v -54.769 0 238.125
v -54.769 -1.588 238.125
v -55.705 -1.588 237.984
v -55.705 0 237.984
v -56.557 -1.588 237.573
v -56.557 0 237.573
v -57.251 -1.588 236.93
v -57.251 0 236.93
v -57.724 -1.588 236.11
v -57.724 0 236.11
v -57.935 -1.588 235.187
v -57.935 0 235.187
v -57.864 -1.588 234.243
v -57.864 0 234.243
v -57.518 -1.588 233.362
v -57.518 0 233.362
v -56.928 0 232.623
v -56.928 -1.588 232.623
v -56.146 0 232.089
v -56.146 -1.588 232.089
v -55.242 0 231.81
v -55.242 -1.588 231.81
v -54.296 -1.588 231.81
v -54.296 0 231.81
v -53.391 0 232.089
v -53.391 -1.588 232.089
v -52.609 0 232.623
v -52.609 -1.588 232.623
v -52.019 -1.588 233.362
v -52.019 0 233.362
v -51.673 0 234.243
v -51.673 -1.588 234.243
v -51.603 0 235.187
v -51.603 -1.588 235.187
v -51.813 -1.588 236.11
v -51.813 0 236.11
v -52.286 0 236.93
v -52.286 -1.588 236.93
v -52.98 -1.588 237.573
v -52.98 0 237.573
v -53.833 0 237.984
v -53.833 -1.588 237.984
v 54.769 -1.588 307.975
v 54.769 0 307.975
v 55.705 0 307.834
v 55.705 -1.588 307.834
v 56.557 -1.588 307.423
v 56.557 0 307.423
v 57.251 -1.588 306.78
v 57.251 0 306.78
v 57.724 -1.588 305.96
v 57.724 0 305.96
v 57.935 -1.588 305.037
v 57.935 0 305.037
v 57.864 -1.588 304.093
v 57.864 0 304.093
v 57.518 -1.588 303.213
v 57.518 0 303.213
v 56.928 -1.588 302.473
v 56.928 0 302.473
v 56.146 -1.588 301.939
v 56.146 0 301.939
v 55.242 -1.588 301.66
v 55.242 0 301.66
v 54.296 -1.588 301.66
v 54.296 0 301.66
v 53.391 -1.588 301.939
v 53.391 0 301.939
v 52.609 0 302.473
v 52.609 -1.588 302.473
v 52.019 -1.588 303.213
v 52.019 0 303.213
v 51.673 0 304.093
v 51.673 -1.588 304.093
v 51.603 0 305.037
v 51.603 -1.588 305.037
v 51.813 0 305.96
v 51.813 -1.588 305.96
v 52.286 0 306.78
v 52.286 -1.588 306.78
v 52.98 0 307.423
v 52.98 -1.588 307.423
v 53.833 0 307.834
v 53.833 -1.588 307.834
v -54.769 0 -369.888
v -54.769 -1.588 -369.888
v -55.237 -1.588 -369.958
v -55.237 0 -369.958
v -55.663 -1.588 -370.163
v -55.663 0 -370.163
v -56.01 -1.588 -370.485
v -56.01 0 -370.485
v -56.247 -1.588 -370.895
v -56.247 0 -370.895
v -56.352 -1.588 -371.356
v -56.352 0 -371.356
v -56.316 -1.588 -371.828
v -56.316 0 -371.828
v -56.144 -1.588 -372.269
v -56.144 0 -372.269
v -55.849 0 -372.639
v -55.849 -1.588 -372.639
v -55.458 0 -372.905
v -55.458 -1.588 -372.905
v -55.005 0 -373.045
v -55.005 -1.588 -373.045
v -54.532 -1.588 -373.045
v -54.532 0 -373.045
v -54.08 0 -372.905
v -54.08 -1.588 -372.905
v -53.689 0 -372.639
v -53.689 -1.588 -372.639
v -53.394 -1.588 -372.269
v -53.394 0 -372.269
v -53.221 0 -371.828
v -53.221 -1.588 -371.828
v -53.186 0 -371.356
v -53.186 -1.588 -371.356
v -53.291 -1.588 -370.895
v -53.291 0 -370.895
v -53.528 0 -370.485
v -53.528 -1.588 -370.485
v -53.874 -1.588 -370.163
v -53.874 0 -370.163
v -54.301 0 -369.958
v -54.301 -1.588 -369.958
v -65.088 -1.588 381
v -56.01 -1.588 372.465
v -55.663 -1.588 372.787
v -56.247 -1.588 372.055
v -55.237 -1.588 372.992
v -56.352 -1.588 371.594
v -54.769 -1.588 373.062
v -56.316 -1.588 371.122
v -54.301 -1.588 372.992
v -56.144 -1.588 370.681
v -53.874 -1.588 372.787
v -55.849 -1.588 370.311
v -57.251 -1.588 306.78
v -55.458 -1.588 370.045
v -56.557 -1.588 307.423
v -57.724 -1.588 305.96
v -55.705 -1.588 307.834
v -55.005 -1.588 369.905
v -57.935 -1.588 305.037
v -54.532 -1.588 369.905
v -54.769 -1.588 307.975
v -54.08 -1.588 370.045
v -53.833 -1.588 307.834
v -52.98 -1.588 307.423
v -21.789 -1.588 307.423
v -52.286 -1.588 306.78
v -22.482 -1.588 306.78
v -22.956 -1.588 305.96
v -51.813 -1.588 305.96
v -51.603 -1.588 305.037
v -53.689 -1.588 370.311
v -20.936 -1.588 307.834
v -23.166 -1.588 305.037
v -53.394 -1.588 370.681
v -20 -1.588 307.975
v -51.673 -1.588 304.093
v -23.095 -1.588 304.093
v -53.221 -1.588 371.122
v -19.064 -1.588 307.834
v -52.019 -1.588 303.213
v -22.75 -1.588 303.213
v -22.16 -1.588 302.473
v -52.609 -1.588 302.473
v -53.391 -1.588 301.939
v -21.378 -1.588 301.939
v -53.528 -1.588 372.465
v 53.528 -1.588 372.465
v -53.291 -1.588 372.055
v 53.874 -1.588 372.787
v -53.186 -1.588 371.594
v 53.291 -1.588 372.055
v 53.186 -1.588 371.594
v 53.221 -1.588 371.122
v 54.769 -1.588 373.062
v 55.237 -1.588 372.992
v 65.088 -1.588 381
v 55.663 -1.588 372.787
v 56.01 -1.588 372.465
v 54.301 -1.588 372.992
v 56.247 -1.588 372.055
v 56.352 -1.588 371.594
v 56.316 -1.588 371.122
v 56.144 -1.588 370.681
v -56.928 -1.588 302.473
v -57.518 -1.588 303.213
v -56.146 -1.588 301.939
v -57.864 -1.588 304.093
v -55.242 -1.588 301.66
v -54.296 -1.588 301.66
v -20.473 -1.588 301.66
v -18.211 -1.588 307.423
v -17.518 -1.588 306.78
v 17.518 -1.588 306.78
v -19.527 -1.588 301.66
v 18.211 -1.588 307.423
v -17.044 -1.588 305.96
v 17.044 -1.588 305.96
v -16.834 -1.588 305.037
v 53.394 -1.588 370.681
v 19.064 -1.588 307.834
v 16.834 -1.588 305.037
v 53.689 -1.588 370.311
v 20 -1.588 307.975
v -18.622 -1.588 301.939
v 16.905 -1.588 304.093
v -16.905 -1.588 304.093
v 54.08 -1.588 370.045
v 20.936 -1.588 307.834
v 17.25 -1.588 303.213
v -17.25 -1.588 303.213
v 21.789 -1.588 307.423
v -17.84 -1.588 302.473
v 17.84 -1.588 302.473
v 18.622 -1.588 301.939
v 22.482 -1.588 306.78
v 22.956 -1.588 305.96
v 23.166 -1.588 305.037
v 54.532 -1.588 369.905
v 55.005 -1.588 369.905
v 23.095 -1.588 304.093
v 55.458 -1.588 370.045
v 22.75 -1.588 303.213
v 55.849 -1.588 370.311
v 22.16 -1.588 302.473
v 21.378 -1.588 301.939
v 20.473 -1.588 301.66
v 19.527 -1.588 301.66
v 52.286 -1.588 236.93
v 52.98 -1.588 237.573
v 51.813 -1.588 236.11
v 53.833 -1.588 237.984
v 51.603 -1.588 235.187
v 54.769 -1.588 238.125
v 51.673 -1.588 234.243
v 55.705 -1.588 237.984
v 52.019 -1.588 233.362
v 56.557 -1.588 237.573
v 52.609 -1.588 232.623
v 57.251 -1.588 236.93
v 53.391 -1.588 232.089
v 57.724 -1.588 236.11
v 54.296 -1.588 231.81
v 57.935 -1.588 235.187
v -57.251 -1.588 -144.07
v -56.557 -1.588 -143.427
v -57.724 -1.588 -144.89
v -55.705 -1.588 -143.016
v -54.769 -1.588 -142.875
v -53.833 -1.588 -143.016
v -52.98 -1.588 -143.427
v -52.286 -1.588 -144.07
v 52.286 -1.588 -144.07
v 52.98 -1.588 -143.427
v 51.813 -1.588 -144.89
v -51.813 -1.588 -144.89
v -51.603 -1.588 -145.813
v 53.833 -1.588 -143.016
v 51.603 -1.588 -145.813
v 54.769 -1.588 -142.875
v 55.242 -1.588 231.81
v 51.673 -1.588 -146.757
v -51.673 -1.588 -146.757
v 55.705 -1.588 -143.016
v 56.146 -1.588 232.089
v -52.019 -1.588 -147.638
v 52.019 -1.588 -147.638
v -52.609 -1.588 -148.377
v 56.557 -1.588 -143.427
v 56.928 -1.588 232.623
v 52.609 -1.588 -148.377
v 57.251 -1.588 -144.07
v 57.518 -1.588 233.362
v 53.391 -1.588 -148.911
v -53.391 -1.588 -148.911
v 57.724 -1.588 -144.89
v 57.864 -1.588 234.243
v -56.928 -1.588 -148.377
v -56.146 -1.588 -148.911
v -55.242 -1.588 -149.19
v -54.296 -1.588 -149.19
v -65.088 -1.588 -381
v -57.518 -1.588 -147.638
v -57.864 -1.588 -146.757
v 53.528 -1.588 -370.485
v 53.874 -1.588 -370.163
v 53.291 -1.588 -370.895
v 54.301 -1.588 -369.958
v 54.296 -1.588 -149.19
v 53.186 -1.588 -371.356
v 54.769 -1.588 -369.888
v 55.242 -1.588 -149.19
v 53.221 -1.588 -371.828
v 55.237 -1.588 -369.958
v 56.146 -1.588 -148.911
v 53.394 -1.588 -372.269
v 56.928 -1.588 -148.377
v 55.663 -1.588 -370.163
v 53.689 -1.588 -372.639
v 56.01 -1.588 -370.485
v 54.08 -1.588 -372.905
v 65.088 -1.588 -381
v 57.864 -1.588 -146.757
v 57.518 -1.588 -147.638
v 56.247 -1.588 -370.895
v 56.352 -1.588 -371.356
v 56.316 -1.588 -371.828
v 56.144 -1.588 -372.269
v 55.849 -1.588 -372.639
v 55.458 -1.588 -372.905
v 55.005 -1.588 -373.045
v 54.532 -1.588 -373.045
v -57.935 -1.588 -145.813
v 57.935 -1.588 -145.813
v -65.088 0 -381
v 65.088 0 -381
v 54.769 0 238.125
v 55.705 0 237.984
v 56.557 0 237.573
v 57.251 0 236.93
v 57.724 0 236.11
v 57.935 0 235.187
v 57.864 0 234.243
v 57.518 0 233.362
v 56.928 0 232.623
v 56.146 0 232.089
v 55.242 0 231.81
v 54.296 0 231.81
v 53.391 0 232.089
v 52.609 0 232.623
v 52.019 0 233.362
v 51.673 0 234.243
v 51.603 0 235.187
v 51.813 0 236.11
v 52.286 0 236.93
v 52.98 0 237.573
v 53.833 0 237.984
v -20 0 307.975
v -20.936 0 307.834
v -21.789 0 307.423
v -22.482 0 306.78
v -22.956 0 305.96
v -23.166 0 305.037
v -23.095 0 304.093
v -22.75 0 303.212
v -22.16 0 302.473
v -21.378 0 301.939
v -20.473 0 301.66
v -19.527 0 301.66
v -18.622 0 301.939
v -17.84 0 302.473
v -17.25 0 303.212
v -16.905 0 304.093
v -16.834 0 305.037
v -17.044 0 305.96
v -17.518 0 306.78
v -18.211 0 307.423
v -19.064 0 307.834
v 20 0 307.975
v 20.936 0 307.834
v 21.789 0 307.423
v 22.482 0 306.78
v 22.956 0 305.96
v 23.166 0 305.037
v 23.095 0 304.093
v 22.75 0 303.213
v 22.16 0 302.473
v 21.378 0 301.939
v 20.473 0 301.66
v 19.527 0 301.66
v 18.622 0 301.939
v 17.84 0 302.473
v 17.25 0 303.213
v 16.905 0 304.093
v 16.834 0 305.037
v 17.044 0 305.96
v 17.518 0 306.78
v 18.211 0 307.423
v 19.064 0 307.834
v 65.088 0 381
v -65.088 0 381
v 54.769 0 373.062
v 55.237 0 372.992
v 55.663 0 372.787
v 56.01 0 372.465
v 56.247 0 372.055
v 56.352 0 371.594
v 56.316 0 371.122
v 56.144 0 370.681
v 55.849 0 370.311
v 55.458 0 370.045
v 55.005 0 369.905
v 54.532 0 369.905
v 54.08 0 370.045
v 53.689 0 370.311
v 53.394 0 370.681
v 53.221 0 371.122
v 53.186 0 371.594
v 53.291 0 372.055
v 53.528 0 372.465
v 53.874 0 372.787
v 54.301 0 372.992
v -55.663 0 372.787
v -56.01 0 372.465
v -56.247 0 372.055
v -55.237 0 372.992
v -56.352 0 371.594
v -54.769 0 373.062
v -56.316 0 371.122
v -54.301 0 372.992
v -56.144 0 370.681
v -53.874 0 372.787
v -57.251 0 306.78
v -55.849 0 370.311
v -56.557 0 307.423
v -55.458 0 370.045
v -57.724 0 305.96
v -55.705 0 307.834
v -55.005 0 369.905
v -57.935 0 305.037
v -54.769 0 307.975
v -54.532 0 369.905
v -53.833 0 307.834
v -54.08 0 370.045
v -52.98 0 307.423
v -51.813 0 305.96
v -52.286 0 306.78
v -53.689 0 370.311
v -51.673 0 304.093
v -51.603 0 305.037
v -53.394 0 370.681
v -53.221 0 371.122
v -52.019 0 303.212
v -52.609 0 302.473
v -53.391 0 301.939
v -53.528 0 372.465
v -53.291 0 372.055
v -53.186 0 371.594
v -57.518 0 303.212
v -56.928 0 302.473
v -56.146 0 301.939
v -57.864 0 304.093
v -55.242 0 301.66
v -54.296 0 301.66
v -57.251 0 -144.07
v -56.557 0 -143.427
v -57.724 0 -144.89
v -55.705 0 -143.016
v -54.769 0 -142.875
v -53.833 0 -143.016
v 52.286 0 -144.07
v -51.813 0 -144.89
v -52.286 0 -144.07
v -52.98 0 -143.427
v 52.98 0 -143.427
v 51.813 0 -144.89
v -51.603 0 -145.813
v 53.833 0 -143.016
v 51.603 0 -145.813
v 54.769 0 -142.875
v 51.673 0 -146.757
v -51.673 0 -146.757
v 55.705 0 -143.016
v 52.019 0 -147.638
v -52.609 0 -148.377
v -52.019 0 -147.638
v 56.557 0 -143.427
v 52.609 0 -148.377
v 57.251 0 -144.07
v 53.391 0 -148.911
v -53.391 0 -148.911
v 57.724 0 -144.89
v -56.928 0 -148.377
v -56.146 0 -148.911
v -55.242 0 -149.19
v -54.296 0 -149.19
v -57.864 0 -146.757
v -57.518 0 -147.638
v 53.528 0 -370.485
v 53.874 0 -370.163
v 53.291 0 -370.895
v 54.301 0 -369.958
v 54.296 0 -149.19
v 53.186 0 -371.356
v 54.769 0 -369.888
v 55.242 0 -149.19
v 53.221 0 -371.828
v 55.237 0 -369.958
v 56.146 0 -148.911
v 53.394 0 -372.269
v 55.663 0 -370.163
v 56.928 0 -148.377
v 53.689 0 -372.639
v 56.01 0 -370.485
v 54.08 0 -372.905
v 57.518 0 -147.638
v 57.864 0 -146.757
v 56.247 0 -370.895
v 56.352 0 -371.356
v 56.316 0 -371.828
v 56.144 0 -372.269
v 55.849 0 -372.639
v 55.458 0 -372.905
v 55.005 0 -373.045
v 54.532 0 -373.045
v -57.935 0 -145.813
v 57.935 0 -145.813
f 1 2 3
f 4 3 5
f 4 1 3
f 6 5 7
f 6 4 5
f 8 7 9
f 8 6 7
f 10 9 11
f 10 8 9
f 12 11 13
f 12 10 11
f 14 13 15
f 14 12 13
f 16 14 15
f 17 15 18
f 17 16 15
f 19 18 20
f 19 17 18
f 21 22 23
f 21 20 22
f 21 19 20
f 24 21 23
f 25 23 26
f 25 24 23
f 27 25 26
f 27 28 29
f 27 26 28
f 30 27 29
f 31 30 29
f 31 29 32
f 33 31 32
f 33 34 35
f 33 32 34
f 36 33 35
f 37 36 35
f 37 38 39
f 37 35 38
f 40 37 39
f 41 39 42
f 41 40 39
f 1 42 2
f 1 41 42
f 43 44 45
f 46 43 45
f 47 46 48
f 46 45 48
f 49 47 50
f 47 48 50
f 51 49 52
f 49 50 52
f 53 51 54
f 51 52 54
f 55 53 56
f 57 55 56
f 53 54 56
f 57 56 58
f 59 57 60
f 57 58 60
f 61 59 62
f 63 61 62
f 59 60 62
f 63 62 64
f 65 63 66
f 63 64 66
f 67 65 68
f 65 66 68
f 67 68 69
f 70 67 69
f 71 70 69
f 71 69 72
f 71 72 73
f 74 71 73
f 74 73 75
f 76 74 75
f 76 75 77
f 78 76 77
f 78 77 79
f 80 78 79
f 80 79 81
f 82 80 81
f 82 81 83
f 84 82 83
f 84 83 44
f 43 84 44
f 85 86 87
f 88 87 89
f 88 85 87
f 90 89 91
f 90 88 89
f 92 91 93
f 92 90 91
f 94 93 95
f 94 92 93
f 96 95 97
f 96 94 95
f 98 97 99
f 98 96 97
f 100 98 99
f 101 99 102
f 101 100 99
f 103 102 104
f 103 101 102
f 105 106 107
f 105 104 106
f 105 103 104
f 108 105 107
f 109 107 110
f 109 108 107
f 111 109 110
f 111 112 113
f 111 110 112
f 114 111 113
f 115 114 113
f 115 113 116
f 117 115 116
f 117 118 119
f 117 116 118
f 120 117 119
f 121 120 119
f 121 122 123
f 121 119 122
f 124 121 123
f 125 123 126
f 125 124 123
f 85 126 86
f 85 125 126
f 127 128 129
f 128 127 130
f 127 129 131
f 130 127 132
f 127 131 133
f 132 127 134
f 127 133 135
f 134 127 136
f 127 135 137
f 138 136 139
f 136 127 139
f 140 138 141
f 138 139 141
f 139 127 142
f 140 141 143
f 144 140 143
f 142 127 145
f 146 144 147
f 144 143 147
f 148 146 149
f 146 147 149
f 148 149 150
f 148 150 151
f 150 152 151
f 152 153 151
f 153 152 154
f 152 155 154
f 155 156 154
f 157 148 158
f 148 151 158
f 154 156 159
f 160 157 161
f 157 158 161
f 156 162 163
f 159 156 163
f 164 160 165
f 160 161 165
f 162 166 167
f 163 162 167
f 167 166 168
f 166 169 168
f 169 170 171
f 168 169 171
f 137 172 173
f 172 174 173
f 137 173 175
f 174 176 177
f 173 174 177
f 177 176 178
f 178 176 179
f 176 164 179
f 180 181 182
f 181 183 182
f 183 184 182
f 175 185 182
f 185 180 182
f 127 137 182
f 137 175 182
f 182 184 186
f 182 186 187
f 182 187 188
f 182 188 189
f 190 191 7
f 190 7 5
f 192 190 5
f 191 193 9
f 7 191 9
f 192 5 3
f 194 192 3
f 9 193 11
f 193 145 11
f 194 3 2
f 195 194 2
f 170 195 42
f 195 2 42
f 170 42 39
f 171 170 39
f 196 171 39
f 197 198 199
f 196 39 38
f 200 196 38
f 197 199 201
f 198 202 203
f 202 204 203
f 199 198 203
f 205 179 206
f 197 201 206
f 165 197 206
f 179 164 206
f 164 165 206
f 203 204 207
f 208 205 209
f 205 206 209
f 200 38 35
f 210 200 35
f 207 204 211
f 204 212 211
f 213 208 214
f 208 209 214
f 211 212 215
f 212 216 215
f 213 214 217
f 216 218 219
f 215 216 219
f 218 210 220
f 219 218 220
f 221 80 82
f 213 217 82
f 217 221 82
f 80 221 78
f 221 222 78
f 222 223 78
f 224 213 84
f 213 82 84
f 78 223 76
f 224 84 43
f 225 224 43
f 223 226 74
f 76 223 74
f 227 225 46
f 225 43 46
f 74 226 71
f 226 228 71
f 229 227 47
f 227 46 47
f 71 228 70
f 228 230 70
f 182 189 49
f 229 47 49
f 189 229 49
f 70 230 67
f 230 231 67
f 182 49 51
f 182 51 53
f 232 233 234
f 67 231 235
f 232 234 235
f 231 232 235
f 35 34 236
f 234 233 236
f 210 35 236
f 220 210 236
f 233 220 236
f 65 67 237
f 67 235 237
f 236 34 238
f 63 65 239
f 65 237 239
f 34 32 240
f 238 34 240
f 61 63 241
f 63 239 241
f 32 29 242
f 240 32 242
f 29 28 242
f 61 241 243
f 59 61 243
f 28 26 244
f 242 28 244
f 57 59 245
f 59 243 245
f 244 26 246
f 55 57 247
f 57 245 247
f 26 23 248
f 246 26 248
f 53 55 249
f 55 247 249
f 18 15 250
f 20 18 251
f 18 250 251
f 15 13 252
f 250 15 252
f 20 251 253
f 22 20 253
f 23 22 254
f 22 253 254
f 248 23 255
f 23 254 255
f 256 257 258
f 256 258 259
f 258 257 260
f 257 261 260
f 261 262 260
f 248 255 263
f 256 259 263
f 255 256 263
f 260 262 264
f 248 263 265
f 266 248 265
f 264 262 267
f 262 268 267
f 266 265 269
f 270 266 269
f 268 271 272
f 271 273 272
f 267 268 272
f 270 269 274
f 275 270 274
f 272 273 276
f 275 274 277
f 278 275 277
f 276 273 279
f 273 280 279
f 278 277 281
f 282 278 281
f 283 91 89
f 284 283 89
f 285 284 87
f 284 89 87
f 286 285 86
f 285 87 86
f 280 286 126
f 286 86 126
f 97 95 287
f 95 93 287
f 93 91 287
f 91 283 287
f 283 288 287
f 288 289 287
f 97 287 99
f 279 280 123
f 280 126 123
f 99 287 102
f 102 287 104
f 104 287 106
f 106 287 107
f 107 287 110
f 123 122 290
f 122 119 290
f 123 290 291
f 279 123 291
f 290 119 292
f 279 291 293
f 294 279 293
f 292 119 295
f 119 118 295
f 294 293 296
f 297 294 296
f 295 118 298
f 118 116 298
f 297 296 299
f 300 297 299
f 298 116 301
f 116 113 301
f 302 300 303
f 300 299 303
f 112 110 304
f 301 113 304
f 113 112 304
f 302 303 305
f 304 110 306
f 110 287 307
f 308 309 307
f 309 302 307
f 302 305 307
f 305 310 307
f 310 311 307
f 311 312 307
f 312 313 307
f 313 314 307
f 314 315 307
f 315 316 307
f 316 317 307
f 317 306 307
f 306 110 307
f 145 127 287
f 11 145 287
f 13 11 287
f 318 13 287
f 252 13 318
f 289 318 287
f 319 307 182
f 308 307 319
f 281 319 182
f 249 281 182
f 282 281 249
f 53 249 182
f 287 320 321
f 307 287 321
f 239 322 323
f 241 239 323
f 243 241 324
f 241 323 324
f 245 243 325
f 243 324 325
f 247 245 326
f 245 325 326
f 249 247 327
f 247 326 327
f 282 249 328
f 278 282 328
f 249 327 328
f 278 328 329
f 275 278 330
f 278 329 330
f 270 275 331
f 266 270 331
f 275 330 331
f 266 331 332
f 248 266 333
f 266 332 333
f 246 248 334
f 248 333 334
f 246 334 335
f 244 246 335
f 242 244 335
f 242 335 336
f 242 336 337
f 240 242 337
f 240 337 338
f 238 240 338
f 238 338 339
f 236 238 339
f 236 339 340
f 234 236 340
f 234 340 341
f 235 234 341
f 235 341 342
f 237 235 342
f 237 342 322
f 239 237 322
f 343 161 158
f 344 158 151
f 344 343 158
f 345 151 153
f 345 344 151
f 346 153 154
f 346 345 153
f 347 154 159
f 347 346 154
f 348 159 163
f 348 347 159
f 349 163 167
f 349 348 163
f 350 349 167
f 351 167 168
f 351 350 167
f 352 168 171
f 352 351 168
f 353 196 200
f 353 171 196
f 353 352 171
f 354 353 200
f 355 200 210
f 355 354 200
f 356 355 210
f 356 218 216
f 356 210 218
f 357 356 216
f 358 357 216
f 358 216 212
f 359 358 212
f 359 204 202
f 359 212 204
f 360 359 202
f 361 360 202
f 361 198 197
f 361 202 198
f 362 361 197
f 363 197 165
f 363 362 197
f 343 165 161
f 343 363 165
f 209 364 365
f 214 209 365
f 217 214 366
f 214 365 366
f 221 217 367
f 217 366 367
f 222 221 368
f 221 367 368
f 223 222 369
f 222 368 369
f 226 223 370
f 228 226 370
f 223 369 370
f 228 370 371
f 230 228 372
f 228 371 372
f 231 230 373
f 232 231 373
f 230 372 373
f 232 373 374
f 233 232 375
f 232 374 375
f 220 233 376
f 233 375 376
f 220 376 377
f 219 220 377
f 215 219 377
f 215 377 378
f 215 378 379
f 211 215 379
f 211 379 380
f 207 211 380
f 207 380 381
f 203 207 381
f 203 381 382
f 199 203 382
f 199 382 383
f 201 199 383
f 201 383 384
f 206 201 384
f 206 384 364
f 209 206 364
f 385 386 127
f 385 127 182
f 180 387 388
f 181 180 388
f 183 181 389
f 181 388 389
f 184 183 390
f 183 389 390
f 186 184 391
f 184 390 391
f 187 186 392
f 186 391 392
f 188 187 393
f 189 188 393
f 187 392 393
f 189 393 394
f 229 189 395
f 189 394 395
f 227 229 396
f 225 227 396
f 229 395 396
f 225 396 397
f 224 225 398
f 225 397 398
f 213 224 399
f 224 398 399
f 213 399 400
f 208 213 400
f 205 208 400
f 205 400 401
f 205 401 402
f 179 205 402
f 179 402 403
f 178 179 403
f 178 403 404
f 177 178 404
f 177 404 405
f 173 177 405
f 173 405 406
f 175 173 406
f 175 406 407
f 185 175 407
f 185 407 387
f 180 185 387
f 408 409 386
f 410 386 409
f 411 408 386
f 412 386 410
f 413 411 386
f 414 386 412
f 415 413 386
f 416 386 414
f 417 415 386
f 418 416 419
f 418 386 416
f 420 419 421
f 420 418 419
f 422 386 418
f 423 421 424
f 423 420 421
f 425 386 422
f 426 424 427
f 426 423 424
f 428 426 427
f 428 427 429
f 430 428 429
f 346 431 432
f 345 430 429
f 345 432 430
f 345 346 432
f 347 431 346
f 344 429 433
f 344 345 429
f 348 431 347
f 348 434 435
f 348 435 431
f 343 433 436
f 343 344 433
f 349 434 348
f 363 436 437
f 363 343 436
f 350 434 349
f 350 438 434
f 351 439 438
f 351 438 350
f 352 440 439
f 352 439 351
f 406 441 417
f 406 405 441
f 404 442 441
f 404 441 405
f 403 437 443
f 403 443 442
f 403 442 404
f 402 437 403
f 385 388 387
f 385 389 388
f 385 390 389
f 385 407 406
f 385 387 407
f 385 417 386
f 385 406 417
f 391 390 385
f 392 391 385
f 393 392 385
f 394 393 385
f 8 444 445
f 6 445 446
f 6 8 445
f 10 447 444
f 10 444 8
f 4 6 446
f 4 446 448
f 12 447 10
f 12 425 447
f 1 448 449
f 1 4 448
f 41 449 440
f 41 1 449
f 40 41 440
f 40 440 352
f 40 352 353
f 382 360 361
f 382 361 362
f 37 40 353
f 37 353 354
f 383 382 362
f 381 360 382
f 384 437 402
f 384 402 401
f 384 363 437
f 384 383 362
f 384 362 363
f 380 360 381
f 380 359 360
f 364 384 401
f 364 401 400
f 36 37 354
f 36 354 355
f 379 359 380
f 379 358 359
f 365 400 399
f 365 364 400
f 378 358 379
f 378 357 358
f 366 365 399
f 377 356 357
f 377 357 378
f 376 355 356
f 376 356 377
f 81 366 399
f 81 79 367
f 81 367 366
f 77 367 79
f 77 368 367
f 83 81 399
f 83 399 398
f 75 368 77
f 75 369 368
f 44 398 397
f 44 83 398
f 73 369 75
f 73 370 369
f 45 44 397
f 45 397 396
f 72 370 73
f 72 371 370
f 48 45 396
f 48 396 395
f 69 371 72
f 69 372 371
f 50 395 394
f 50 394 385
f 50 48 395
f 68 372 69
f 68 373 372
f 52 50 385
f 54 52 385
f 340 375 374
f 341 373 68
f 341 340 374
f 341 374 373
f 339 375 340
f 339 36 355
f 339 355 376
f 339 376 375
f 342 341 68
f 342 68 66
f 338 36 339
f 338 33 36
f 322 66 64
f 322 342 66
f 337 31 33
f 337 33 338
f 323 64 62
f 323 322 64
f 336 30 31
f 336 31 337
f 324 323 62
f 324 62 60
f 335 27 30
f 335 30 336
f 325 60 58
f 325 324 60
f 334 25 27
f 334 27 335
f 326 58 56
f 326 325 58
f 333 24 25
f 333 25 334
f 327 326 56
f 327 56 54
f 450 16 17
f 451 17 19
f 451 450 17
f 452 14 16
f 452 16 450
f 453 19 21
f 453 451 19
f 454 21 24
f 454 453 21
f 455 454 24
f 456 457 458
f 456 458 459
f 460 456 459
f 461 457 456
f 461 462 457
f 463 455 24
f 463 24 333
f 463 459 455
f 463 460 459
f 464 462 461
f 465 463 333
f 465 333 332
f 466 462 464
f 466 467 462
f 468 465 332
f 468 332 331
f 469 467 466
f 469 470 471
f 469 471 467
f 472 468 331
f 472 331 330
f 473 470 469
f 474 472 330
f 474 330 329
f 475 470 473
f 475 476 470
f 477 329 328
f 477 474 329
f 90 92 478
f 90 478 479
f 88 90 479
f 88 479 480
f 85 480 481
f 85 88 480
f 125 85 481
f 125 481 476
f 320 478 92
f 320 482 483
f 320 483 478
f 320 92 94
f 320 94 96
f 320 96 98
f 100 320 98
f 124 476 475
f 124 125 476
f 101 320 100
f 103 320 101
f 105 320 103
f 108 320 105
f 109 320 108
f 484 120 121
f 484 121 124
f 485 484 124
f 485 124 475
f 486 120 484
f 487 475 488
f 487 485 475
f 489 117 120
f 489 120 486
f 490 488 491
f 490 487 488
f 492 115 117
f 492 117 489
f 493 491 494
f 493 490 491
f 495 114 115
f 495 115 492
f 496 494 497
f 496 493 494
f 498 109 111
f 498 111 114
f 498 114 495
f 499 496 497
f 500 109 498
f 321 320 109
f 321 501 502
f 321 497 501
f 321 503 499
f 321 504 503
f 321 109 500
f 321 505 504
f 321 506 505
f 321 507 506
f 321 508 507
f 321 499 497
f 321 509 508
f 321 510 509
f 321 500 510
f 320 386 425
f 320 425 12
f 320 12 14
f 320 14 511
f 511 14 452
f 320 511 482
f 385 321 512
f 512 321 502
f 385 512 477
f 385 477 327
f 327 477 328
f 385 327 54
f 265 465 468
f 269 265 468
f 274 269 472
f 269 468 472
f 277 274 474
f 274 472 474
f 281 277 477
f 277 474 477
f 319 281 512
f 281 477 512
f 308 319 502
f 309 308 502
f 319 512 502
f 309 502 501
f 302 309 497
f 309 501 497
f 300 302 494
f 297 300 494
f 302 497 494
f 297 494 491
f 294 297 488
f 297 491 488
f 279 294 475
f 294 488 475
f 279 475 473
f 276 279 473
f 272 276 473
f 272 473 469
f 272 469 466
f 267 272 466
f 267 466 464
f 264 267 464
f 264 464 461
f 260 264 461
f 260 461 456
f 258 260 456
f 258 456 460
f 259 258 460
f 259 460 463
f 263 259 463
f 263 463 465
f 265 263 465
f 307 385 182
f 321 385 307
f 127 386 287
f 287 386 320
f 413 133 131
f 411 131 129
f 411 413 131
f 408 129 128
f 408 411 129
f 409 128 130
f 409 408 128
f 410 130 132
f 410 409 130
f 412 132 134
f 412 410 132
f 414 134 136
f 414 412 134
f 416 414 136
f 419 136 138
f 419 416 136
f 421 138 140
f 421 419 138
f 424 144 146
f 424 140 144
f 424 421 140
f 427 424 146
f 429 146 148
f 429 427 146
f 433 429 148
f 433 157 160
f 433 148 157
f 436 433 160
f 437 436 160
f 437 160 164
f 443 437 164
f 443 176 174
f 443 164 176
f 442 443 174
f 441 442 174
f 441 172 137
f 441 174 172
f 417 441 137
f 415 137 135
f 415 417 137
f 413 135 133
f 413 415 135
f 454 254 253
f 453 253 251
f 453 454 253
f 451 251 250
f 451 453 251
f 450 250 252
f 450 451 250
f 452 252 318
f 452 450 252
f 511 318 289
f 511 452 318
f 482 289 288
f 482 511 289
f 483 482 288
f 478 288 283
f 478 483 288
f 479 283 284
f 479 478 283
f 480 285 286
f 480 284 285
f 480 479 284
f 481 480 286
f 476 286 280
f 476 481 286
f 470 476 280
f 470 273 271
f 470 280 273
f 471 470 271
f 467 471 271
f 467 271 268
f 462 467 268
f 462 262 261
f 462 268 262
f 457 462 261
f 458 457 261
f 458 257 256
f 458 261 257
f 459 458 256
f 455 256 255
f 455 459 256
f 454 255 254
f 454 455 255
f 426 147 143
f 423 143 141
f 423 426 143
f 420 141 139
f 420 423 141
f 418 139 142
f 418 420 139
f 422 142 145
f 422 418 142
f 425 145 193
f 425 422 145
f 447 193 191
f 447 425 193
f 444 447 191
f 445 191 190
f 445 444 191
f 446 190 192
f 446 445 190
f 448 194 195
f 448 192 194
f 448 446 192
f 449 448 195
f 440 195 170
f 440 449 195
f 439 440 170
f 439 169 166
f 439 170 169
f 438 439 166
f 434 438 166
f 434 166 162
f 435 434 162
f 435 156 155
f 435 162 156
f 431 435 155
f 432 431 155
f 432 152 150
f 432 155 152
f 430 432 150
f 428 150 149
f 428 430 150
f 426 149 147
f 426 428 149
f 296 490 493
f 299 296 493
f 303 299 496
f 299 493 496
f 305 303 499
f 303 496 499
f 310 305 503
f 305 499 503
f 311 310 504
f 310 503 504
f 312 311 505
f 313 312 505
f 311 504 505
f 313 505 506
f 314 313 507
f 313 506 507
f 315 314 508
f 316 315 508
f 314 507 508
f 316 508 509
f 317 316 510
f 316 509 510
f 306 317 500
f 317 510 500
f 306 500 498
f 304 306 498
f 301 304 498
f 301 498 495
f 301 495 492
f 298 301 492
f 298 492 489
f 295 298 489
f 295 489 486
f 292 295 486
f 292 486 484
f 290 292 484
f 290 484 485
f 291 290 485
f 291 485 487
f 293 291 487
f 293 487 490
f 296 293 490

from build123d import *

# Parameters (mm, degrees)
SKETCH1_W           = 130.175
SKETCH1_H           = 762
BOSS_EXTRUDE1_DEPTH = 1.5875
SKETCH2_R           = 1.5875
SKETCH2_R_2         = 3.175
CUT_EXTRUDE2_DEPTH  = 387.522836082


with BuildPart() as part:
    # Sketch1 → Boss-Extrude1 (new body)
    with BuildSketch(Plane(origin=(0, 0, 0), x_dir=(1, 0, 0), z_dir=(0, 1, 0))):
        Rectangle(SKETCH1_W, SKETCH1_H)
    extrude(amount=-BOSS_EXTRUDE1_DEPTH)

    # Sketch2 → Cut-Extrude2 (cut, through all)
    with BuildSketch(Plane(origin=(0, 0, 0), x_dir=(1, 0, 0), z_dir=(0, 1, 0))):
        with Locations(Location((54.76875, -371.475, 0), (0, 0, 270))):
            Circle(SKETCH2_R)
        with Locations(Location((54.76875, -234.95, 0), (0, 0, 270))):
            Circle(SKETCH2_R_2)
        with Locations(Location((54.76875, 371.475, 0), (0, 0, 270))):
            Circle(SKETCH2_R)
        with Locations(Location((54.76875, 146.05, 0), (0, 0, 270))):
            Circle(SKETCH2_R_2)
        with Locations(Location((54.76875, -304.8, 0), (0, 0, 270))):
            Circle(SKETCH2_R_2)
        with Locations(Location((20.0000108, -304.8, 0), (0, 0, 270))):
            Circle(SKETCH2_R_2)
    cut_extrude2 = extrude(amount=-CUT_EXTRUDE2_DEPTH, mode=Mode.SUBTRACT)

    # Mirror2: Cut-Extrude2 across plane
    add(cut_extrude2.mirror(Plane(origin=(0, 0, 0), x_dir=(0, 0, 1), z_dir=(1, 0, 0))), mode=Mode.SUBTRACT)


solid = part.part
